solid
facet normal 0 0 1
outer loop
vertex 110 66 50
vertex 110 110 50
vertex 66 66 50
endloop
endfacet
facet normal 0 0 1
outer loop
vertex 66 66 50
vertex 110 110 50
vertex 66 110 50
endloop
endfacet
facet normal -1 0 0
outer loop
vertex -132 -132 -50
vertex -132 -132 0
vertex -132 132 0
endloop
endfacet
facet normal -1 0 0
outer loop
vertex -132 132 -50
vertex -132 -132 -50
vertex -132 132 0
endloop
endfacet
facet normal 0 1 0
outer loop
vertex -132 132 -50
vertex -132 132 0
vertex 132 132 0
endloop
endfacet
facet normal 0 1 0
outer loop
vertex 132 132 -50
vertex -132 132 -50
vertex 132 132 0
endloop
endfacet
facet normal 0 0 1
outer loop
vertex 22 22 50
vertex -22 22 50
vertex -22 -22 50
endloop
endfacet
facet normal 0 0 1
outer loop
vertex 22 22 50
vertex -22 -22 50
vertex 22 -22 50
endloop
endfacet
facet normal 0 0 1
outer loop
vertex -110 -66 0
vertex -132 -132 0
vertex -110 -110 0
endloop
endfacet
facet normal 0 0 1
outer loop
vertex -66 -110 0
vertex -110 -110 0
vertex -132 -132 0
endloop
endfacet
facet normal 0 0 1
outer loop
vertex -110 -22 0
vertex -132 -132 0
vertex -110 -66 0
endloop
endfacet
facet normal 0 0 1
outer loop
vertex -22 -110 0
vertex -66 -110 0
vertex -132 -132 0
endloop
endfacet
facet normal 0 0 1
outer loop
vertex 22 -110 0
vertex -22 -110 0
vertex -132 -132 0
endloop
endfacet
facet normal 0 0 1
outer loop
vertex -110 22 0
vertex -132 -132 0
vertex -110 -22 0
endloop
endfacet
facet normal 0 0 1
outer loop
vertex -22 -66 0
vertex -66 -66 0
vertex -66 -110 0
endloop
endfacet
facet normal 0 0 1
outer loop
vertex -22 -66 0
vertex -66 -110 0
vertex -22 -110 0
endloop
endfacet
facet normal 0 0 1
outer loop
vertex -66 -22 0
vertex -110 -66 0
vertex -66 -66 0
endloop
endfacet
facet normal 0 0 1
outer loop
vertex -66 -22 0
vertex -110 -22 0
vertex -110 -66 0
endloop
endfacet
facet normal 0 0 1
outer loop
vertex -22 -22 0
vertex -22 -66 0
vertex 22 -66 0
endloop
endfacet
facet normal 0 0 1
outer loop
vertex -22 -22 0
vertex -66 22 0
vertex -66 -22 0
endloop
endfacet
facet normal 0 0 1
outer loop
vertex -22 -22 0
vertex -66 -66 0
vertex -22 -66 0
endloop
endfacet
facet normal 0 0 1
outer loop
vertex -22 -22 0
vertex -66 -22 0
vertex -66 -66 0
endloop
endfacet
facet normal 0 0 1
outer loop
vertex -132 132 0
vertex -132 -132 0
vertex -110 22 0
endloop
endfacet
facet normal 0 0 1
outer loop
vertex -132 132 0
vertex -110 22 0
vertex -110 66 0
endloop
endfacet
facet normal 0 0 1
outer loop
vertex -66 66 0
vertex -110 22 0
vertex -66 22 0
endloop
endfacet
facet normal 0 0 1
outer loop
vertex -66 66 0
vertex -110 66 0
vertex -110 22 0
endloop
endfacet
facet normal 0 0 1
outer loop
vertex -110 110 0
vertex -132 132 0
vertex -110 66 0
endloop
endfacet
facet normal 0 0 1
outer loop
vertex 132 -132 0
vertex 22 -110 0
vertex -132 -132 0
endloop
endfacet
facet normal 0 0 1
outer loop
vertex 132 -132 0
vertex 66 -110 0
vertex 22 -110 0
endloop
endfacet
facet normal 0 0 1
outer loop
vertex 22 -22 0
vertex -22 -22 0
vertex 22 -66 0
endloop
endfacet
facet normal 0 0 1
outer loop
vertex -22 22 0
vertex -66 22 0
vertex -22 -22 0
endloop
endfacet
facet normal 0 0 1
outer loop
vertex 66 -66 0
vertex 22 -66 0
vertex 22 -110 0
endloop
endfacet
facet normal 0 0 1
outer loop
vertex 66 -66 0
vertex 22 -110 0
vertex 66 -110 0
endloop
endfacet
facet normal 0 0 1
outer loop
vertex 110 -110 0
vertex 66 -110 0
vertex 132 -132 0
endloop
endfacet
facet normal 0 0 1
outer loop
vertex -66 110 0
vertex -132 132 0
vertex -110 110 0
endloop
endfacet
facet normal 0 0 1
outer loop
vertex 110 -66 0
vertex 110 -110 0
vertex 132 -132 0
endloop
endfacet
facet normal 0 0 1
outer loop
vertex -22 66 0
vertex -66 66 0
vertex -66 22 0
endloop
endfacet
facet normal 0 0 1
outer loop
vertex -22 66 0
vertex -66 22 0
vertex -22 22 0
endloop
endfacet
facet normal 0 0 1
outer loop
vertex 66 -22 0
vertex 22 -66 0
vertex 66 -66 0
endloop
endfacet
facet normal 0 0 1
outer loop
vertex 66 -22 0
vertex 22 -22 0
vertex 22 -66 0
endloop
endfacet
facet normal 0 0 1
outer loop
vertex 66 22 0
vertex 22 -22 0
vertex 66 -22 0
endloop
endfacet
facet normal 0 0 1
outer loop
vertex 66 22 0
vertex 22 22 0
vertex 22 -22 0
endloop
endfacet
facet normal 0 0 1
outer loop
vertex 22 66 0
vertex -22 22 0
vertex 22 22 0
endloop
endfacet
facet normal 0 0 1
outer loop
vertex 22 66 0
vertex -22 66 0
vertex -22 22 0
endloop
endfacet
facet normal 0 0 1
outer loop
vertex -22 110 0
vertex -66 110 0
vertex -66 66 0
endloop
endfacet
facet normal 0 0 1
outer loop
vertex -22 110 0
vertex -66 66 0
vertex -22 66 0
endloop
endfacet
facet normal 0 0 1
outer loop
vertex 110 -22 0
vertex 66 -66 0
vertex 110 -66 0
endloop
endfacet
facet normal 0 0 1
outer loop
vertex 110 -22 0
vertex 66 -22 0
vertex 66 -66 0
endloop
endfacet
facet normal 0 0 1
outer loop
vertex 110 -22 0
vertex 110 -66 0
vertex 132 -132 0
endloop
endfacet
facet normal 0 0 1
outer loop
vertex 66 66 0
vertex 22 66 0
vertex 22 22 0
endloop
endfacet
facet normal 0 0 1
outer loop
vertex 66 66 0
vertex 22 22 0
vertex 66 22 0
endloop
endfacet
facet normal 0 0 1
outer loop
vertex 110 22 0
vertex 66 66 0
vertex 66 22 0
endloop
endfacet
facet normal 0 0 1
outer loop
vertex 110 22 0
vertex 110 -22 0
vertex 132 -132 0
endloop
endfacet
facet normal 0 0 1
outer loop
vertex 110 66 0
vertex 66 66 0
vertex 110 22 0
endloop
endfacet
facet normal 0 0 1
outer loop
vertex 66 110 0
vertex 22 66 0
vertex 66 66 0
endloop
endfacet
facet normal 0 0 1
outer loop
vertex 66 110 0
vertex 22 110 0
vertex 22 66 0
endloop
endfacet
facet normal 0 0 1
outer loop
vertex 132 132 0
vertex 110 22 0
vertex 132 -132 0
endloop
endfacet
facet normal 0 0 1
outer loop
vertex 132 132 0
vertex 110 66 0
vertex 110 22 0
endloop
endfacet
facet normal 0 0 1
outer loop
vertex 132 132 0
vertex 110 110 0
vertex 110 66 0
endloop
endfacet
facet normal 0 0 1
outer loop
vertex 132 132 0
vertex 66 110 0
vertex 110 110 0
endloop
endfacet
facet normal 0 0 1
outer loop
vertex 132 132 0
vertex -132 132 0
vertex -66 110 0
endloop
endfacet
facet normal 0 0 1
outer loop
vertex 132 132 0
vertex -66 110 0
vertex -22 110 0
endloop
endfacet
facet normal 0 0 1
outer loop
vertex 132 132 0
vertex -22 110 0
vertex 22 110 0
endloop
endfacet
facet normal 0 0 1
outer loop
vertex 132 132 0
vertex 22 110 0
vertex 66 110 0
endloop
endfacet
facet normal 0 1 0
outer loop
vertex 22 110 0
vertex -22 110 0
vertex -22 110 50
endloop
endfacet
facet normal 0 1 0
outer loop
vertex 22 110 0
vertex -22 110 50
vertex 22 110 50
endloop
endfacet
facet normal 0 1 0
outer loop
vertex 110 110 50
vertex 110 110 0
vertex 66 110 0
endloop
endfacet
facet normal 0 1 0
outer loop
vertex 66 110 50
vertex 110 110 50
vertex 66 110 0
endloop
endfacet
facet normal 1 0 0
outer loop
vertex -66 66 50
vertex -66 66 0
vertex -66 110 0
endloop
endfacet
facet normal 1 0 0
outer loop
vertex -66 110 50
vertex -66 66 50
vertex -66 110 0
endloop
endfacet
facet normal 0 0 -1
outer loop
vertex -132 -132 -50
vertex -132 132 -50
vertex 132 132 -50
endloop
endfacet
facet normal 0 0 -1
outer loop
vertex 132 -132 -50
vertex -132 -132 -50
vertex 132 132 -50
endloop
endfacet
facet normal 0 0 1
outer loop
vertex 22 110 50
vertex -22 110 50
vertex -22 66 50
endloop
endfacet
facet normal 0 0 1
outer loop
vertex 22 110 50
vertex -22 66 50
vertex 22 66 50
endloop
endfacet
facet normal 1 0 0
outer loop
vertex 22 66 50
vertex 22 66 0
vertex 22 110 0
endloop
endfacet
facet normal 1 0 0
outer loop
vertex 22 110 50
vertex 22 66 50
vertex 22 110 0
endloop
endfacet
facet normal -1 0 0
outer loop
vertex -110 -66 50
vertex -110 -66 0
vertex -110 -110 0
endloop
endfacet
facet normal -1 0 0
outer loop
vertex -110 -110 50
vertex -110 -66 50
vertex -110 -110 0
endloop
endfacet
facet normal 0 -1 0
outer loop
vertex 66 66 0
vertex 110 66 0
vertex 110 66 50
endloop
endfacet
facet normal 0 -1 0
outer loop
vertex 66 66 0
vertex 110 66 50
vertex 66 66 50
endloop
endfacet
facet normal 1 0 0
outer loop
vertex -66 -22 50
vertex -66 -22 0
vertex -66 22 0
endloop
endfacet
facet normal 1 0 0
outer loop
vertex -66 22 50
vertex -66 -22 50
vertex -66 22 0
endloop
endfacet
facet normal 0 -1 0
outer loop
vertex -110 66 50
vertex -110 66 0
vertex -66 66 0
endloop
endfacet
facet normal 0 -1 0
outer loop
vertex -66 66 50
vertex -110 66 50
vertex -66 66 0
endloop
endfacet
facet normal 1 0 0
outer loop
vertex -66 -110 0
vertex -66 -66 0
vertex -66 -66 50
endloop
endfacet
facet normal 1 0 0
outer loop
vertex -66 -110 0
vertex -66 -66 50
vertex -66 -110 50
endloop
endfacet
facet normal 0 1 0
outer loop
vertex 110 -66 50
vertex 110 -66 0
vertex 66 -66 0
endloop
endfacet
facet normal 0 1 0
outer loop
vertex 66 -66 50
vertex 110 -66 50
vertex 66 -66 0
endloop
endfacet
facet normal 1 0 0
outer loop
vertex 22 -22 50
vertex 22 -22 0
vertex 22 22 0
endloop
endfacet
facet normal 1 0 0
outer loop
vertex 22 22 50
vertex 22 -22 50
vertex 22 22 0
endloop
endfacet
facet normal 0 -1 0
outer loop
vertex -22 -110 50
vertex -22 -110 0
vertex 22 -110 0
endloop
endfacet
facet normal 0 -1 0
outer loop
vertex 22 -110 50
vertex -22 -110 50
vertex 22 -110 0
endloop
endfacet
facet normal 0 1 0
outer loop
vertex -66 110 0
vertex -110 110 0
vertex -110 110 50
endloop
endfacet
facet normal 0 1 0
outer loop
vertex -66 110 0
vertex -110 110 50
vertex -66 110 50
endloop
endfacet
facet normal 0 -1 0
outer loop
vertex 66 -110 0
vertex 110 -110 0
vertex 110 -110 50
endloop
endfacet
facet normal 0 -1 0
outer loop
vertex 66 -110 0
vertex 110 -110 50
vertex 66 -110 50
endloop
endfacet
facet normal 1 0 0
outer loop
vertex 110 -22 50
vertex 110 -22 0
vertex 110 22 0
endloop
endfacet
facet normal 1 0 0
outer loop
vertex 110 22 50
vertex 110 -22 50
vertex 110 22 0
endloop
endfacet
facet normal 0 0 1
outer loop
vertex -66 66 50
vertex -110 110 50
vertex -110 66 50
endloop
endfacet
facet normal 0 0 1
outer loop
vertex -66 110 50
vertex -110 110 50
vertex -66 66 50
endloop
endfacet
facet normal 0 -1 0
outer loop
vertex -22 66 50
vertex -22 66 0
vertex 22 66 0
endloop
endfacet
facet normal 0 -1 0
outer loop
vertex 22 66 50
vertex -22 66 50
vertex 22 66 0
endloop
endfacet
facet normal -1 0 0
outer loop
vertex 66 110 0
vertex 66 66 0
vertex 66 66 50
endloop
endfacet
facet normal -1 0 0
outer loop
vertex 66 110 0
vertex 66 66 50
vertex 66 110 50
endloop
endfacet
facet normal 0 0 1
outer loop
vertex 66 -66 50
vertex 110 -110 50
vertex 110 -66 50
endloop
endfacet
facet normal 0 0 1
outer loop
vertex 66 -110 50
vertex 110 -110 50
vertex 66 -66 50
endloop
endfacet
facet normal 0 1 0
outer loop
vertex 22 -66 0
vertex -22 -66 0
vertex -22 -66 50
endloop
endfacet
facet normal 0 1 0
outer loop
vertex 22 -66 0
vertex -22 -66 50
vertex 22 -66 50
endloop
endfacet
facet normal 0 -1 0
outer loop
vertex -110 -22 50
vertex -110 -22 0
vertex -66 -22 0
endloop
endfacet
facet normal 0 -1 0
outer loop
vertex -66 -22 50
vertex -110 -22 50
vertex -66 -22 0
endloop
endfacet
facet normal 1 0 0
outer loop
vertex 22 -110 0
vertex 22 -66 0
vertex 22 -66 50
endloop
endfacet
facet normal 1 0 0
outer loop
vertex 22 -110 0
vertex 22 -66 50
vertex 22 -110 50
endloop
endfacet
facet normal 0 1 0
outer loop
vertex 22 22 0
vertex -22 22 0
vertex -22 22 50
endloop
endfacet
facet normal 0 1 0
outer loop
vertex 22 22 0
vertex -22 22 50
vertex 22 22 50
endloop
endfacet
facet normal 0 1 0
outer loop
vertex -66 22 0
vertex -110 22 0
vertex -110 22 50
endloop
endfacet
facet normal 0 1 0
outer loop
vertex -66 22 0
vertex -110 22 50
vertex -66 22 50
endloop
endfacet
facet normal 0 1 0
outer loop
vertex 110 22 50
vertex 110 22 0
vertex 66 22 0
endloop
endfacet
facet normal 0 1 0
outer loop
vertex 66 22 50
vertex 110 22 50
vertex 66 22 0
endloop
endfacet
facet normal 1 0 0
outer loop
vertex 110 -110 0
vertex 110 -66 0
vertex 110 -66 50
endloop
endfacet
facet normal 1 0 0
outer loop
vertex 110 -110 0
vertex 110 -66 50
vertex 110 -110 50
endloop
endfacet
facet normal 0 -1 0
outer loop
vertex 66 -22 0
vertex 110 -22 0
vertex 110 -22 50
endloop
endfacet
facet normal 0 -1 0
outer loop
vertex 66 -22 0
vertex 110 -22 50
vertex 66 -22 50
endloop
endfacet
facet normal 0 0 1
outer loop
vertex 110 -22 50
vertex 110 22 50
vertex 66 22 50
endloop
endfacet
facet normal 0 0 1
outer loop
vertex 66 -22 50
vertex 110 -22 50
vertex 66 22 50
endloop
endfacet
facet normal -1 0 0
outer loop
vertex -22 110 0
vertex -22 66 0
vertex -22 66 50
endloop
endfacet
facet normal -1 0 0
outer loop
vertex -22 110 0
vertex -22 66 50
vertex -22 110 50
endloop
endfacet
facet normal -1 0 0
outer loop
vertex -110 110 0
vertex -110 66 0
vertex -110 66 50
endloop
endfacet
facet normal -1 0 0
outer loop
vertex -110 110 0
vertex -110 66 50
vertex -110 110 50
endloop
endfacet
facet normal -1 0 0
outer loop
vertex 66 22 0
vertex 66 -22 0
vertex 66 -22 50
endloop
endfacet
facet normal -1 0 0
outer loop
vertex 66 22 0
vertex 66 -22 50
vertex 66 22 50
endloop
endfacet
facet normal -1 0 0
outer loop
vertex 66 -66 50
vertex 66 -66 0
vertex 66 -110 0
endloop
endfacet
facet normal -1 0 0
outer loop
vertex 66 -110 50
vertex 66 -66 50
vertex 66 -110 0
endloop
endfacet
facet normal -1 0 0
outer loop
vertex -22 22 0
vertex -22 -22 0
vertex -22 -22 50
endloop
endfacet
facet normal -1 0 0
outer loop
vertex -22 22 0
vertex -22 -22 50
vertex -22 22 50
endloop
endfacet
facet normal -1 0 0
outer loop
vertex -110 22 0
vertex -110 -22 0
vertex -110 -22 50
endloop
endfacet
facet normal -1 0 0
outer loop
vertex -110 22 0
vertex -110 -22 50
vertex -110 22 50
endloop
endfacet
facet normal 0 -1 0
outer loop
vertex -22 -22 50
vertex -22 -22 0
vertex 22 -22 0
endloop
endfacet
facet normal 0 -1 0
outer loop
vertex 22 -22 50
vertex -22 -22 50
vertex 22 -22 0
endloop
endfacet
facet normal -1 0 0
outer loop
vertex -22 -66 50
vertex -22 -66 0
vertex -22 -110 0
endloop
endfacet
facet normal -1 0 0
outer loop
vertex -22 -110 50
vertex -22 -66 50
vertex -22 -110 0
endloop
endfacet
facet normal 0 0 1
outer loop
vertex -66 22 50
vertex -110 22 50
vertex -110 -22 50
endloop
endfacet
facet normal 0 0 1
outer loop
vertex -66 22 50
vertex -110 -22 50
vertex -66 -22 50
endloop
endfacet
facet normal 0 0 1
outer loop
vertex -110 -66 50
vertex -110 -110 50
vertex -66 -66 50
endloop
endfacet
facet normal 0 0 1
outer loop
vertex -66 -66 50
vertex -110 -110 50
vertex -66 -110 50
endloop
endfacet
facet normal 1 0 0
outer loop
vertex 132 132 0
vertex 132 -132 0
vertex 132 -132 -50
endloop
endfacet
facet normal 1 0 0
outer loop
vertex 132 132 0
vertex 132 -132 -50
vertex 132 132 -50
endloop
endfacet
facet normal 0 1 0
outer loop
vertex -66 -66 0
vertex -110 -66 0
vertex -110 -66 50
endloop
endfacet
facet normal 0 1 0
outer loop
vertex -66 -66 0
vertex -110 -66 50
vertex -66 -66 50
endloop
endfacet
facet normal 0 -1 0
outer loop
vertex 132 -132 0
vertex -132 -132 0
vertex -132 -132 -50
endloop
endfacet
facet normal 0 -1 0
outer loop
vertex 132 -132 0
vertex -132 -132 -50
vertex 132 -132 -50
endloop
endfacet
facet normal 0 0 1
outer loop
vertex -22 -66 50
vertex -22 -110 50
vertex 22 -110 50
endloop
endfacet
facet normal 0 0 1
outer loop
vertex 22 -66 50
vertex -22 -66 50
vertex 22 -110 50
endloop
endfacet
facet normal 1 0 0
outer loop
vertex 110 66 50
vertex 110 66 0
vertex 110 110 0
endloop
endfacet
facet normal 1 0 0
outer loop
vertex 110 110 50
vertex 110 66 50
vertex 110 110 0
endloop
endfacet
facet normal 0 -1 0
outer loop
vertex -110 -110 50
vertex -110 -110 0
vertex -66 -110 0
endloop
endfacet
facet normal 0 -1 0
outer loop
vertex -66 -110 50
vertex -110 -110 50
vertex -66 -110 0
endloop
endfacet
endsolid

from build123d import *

# Parameters (mm, degrees)
F0_W     = 44
F0_H     = 44
F1_DEPTH = 50
F0_W_2   = 264
F0_H_2   = 264
F4_DEPTH = 50


with BuildPart() as f1:
    # F0 (on Top) → F1 (new body)
    with BuildSketch(Plane.XY):
        with Locations((-88, 0)):
            Rectangle(F0_W, F0_H)
    extrude(amount=F1_DEPTH)


with BuildPart() as f1b:
    # F0 (on Top) → F1, piece 2 (new body)
    with BuildSketch(Plane.XY):
        with Locations((-88, 88)):
            Rectangle(F0_W, F0_H)
    extrude(amount=F1_DEPTH)


with BuildPart() as f1c:
    # F0 (on Top) → F1, piece 3 (new body)
    with BuildSketch(Plane.XY):
        with Locations((0, 88)):
            Rectangle(F0_W, F0_H)
    extrude(amount=F1_DEPTH)


with BuildPart() as f1d:
    # F0 (on Top) → F1, piece 4 (new body)
    with BuildSketch(Plane.XY):
        Rectangle(F0_W, F0_H)
    extrude(amount=F1_DEPTH)


with BuildPart() as f2_1:
    # F2: instance of F1
    add(f1.part.mirror(Plane.YZ))


with BuildPart() as f2_2:
    # F2: instance of F1b
    add(f1b.part.mirror(Plane.YZ))


with BuildPart() as f3_1:
    # F3: instance of F1b
    add(f1b.part.mirror(Plane.XZ))


with BuildPart() as f3_2:
    # F3: instance of F1c
    add(f1c.part.mirror(Plane.XZ))


with BuildPart() as f3_3:
    # F3: instance of F2_2
    add(f2_2.part.mirror(Plane.XZ))


with BuildPart() as f1_1:
    add(f1.part)

    add(f1b.part)  # F4 merges F1b

    add(f1c.part)  # F4 merges F1c

    add(f1d.part)  # F4 merges F1d

    add(f2_1.part)  # F4 merges F2_1

    add(f2_2.part)  # F4 merges F2_2

    add(f3_1.part)  # F4 merges F3_1

    add(f3_2.part)  # F4 merges F3_2

    add(f3_3.part)  # F4 merges F3_3
    # F0 (on Top) → F4 (join)
    with BuildSketch(Plane.XY):
        Rectangle(F0_W_2, F0_H_2)
        with Locations((-88, 0)):
            Rectangle(F0_W, F0_H, mode=Mode.SUBTRACT)
        with Locations((-88, 88)):
            Rectangle(F0_W, F0_H, mode=Mode.SUBTRACT)
        Rectangle(F0_W, F0_H, mode=Mode.SUBTRACT)
        with Locations((0, 88)):
            Rectangle(F0_W, F0_H, mode=Mode.SUBTRACT)
        with Locations((-88, 0)):
            Rectangle(F0_W, F0_H)
        Rectangle(F0_W, F0_H)
        with Locations((-88, 88)):
            Rectangle(F0_W, F0_H)
        with Locations((0, 88)):
            Rectangle(F0_W, F0_H)
    extrude(amount=-F4_DEPTH)


solid = f1_1.part
